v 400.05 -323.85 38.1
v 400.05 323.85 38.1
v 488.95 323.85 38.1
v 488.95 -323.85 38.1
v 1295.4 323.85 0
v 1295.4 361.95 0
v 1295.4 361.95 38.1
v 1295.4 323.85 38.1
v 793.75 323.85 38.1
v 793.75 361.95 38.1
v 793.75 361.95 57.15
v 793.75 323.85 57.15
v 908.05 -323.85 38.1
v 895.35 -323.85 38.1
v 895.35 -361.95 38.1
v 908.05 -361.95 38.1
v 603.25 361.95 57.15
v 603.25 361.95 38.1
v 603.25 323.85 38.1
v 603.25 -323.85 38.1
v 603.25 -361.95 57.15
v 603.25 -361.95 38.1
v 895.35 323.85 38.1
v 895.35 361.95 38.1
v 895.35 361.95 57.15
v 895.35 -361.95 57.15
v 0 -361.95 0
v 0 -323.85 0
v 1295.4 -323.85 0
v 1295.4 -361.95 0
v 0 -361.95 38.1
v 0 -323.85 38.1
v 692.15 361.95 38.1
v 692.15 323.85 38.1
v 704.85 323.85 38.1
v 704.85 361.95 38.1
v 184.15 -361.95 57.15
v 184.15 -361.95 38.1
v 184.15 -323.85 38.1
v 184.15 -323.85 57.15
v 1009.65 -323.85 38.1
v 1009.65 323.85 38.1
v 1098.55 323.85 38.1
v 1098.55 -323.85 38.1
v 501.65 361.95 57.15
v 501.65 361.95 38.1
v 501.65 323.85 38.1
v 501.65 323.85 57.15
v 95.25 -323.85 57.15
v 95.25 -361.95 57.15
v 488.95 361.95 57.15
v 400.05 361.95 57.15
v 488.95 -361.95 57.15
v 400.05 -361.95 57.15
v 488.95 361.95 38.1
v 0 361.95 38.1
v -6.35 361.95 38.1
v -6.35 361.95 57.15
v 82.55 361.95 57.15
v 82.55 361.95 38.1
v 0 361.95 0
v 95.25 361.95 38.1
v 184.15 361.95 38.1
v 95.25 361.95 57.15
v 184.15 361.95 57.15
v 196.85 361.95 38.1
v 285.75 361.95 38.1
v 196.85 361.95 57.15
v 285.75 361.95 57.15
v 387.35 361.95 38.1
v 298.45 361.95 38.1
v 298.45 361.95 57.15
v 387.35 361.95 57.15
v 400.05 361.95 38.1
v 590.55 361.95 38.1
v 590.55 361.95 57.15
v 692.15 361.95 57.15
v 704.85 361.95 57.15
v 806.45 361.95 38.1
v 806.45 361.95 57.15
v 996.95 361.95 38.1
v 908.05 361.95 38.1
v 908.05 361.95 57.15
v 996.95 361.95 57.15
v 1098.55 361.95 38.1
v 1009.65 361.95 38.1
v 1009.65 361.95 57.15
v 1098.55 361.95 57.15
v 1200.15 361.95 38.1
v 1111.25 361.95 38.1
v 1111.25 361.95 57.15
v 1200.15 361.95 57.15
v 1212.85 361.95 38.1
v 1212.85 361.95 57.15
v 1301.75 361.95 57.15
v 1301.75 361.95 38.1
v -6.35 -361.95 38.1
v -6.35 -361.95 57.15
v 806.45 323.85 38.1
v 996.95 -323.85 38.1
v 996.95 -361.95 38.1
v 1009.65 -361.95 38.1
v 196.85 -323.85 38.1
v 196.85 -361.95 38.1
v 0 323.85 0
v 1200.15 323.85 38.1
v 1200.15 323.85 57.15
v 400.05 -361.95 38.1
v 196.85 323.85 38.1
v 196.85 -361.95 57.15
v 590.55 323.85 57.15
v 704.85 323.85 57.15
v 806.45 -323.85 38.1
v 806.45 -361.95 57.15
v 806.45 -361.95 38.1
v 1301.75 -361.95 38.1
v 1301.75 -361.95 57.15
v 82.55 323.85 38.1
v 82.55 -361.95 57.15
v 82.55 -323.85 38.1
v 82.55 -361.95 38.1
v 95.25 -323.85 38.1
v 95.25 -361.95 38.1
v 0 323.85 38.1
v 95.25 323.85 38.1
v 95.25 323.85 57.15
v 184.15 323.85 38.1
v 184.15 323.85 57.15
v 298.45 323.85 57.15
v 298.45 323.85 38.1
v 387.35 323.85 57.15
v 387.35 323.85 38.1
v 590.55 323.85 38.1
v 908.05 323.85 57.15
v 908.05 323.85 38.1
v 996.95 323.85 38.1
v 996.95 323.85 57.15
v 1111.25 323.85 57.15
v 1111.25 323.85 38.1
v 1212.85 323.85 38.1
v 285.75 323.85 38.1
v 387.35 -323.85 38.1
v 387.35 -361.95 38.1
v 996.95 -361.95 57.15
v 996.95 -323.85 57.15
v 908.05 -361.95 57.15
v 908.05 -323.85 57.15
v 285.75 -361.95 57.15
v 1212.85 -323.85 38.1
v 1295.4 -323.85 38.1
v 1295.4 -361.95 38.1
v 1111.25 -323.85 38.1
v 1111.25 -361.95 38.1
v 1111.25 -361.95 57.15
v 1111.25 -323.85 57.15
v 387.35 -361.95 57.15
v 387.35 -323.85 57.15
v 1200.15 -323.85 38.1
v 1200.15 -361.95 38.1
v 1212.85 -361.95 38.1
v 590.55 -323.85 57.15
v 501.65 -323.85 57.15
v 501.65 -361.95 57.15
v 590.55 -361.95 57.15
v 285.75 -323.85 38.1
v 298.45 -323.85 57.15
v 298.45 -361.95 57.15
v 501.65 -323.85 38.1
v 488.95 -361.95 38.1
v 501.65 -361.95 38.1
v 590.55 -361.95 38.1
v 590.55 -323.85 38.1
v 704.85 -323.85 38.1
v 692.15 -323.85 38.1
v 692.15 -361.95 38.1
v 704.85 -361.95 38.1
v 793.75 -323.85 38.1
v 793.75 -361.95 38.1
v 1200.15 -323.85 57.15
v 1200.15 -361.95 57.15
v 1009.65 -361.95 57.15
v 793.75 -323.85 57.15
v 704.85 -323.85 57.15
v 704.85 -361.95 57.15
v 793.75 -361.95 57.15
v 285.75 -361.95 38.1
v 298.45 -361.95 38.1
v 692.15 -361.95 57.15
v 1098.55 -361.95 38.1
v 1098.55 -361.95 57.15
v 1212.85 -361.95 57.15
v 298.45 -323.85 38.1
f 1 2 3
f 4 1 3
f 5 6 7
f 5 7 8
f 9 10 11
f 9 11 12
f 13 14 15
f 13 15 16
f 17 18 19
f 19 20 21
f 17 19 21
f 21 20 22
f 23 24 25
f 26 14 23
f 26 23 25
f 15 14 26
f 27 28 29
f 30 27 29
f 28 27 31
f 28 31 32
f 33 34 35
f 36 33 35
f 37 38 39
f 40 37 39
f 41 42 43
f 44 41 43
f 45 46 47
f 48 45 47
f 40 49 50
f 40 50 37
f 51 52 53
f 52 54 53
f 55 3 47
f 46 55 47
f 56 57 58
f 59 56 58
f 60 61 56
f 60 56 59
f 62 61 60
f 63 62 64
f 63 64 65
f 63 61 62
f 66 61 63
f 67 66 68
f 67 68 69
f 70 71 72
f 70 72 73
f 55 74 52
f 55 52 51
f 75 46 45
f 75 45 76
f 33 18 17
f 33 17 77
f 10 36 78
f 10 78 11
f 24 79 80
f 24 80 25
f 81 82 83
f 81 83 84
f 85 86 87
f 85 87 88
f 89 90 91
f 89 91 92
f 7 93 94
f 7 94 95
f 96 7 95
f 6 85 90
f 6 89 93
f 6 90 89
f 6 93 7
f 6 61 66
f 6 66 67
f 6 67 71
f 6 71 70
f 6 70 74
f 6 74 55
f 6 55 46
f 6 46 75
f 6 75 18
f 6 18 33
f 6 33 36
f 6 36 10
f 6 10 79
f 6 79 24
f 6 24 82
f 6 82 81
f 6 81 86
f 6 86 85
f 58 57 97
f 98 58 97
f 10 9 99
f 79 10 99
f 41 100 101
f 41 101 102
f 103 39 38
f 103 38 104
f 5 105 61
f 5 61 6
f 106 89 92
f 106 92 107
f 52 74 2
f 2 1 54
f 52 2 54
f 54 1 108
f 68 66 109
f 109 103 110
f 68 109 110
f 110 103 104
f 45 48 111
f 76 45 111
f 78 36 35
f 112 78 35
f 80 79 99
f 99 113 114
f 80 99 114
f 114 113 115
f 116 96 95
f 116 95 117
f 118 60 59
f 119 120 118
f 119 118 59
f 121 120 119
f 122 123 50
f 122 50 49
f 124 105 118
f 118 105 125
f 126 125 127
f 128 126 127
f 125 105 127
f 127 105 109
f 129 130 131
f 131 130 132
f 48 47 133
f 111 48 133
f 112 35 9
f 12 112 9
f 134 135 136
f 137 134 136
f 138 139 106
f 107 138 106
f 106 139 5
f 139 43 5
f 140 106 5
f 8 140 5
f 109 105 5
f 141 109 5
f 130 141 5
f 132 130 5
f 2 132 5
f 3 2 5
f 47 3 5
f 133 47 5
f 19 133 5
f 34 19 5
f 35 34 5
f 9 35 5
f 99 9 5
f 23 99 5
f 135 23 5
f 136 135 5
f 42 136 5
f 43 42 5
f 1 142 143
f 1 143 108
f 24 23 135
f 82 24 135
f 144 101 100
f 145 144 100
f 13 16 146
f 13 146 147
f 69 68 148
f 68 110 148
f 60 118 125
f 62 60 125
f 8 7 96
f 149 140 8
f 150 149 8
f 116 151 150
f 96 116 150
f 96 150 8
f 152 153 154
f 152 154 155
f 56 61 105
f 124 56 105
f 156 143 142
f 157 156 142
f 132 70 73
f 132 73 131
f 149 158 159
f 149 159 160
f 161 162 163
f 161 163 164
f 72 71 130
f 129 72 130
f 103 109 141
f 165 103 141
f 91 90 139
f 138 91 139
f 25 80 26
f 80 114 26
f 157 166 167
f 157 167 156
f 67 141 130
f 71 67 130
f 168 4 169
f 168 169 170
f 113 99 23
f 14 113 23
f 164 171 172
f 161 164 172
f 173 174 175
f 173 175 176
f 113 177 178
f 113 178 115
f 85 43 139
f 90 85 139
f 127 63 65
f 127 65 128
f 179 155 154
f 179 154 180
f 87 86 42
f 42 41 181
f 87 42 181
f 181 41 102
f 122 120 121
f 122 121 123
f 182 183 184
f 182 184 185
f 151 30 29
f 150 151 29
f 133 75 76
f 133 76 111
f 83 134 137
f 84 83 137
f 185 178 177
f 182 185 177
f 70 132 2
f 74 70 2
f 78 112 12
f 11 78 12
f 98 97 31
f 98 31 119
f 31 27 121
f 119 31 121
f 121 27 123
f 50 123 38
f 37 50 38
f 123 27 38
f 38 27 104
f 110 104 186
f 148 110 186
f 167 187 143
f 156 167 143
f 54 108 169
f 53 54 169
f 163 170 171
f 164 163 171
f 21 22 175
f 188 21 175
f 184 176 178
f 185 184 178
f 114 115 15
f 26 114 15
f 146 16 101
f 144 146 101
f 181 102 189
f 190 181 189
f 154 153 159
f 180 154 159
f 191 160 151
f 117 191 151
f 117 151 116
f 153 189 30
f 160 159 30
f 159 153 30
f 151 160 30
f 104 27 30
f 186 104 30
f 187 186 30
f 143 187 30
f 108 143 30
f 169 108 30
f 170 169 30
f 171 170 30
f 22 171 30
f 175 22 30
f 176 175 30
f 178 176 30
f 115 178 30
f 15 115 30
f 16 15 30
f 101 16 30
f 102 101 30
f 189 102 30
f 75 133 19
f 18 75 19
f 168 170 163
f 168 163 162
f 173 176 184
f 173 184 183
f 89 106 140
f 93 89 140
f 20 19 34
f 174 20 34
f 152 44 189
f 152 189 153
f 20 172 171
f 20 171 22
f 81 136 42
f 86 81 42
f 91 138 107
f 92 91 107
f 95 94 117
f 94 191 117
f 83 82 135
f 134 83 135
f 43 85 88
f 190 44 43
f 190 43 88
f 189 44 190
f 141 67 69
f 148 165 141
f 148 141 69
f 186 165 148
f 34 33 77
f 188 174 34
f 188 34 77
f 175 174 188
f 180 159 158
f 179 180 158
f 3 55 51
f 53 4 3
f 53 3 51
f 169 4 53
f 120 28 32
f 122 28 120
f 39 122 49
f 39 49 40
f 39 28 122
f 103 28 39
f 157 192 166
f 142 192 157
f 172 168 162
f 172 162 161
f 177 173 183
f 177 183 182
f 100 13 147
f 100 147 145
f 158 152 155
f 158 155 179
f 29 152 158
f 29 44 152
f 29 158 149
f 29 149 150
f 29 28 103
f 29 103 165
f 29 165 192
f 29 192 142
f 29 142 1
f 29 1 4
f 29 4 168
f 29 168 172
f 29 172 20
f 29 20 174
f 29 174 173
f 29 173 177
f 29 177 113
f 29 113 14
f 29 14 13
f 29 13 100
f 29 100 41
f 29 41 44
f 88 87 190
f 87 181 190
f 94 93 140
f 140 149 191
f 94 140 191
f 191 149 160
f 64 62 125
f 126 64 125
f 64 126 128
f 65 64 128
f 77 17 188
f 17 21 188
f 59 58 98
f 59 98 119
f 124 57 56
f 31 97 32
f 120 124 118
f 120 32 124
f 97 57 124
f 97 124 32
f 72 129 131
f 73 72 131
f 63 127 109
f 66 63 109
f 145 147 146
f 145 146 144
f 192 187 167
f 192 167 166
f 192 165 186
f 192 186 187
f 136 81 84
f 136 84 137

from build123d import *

# Parameters (mm, degrees)
F0_W     = 1295.4
F0_H     = 38.1
F1_DEPTH = 38.1
F2_W     = 88.9
F2_H     = 361.95
F2_H_2   = 38.1
F3_DEPTH = 19.05


with BuildPart() as f1:
    # F0 (on Top) → F1 (new body)
    with BuildSketch(Plane.XY):
        with Locations((647.7, -342.9)):
            Rectangle(F0_W, F0_H)
    extrude(amount=F1_DEPTH)

    # F2 (on face) → F3 (join)
    with BuildSketch(Plane.XY.offset(38.1)):
        with Locations((647.7, -180.975)):
            Rectangle(F2_W, F2_H)
        with Locations((850.9, -180.975)):
            Rectangle(F2_W, F2_H)
        with Locations((1054.1, -180.975)):
            Rectangle(F2_W, F2_H)
        with Locations((1257.3, -180.975)):
            Rectangle(F2_W, F2_H)
        with Locations((444.5, -180.975)):
            Rectangle(F2_W, F2_H)
        with Locations((241.3, -180.975)):
            Rectangle(F2_W, F2_H)
        with Locations((38.1, -180.975)):
            Rectangle(F2_W, F2_H)
        with Locations((749.3, -342.9)):
            Rectangle(F2_W, F2_H_2)
        with Locations((952.5, -342.9)):
            Rectangle(F2_W, F2_H_2)
        with Locations((1155.7, -342.9)):
            Rectangle(F2_W, F2_H_2)
        with Locations((546.1, -342.9)):
            Rectangle(F2_W, F2_H_2)
        with Locations((342.9, -342.9)):
            Rectangle(F2_W, F2_H_2)
        with Locations((139.7, -342.9)):
            Rectangle(F2_W, F2_H_2)
    extrude(amount=F3_DEPTH)

    # F4: F1 across plane


with BuildPart() as f1_1:
    add(f1.part)
    add(f1.part.mirror(Plane.XZ))


solid = f1_1.part
